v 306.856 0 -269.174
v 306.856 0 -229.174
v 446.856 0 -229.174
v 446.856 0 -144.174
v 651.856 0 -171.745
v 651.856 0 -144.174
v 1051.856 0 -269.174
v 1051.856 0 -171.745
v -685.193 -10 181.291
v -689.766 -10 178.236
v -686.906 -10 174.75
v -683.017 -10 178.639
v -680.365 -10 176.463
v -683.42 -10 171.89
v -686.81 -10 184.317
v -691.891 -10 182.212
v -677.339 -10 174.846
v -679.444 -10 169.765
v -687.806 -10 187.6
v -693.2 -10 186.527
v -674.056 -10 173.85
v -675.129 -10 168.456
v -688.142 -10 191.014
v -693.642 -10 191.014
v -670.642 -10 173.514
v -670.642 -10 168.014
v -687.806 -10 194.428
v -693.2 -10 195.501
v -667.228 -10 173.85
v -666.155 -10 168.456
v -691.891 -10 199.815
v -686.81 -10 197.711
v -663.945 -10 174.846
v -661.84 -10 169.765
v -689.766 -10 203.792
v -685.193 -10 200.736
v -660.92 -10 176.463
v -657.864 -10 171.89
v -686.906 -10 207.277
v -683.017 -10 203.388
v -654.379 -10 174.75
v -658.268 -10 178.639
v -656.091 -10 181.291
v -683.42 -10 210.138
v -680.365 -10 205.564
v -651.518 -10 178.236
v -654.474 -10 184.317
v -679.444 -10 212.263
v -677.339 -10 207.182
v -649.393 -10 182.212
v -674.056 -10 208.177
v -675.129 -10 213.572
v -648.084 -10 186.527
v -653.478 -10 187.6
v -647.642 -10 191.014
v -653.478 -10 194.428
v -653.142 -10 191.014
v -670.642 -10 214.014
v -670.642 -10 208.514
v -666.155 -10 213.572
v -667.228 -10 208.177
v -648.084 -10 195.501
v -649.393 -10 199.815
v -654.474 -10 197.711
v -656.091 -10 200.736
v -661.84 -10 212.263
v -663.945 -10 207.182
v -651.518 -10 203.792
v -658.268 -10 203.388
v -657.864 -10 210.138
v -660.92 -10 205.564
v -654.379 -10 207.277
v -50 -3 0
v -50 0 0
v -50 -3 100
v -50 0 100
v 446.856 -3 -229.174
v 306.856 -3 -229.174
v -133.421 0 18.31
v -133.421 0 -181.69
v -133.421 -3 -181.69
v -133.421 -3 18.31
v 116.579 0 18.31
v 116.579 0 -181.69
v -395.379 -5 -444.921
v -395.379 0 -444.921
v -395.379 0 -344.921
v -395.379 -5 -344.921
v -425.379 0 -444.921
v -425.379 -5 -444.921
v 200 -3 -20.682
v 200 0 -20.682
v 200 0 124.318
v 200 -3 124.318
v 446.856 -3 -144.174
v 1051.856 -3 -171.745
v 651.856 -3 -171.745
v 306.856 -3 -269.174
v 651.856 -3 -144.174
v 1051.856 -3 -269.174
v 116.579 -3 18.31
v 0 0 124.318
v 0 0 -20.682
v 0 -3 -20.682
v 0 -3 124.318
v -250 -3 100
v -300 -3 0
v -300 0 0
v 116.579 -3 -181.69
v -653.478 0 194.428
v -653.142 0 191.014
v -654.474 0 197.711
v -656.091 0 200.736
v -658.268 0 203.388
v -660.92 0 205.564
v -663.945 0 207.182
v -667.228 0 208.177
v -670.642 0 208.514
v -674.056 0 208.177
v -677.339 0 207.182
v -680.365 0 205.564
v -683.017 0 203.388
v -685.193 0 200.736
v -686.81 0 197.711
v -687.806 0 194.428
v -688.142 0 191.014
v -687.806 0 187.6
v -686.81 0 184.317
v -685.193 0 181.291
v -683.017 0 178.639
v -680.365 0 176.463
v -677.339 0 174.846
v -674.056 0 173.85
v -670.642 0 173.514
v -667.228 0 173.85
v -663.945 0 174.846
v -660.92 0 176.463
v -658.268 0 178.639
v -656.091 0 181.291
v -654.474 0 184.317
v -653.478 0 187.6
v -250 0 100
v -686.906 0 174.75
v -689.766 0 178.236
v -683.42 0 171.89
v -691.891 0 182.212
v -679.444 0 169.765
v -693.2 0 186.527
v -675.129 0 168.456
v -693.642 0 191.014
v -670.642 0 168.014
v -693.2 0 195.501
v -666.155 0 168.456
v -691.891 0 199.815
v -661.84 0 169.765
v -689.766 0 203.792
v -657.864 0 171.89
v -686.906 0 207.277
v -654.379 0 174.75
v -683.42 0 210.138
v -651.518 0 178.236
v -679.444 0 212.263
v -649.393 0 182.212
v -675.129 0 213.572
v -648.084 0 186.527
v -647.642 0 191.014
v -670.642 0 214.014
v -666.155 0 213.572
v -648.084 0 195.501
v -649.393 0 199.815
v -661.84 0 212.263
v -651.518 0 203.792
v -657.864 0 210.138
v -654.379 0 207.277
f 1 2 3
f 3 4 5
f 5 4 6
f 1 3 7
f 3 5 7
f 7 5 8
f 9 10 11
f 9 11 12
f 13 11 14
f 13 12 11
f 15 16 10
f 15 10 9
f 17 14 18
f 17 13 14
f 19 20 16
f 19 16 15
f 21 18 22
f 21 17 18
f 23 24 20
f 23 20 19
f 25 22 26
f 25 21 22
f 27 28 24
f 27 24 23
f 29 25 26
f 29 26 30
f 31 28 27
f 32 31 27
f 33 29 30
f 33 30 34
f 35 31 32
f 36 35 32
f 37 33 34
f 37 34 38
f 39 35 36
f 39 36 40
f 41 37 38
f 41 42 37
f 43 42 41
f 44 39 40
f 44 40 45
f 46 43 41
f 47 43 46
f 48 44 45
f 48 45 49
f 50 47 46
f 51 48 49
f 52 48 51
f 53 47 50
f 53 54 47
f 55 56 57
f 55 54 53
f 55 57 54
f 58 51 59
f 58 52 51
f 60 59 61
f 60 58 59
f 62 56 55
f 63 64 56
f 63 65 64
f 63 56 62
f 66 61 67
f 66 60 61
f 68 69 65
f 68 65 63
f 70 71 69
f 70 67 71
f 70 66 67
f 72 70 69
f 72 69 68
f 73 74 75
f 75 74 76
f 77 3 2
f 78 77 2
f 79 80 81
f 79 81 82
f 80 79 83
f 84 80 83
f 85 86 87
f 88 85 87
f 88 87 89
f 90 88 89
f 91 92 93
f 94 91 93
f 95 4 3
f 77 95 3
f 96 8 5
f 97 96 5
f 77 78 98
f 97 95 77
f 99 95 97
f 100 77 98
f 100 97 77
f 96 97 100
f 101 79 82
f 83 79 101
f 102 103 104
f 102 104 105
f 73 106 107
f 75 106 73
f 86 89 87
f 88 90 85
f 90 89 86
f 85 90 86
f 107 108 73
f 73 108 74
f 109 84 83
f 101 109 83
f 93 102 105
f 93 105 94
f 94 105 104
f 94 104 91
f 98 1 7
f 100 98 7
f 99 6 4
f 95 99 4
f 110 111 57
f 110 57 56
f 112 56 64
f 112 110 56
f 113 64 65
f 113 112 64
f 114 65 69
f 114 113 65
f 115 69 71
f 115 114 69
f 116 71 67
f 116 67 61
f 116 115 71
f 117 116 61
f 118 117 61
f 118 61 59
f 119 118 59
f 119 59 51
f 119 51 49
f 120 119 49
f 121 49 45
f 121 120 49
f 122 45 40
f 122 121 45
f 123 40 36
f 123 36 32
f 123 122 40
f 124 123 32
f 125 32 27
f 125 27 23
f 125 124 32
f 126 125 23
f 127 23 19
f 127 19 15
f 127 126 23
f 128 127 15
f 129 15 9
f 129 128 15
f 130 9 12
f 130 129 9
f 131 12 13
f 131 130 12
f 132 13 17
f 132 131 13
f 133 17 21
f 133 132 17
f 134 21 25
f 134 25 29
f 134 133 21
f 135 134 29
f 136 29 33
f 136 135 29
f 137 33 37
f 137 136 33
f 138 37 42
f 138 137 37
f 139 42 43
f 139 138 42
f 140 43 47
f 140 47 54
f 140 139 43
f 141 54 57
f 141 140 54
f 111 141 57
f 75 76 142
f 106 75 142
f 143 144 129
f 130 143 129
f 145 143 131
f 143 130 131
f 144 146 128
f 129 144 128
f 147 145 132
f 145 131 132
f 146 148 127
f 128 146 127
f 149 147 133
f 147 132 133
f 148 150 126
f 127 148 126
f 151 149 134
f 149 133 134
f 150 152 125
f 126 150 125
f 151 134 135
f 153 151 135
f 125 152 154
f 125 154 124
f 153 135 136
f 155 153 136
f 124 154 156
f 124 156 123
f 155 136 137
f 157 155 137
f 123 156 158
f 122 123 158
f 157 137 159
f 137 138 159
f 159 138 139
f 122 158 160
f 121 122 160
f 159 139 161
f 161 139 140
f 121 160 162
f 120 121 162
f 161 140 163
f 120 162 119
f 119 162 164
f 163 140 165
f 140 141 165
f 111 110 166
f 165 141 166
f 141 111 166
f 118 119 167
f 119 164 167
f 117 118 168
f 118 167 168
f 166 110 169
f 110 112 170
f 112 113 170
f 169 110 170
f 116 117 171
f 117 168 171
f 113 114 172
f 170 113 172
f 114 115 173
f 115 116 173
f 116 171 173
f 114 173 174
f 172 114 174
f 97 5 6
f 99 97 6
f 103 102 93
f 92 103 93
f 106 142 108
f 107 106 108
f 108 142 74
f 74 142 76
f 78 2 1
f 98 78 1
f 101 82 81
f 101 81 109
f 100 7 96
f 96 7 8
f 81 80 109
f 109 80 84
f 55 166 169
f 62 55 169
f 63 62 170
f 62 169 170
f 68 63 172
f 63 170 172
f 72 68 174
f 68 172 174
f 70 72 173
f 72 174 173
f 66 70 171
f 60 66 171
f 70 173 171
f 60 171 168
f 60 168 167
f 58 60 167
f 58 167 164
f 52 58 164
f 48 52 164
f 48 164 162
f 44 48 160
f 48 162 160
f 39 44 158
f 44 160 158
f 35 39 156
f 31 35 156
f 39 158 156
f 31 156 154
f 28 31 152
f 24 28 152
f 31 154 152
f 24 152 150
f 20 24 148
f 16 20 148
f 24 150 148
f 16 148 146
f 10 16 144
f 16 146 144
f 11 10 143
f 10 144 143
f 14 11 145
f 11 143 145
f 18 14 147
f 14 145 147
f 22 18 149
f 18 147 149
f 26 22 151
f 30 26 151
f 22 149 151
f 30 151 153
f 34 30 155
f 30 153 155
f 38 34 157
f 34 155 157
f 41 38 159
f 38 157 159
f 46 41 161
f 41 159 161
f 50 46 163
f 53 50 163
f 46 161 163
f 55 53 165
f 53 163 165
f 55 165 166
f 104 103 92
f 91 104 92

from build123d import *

# Parameters (mm, degrees)
F0_W      = 200
F0_H      = 145
F1_DEPTH  = 3
F3_DEPTH  = 3
F4_W      = 250
F4_H      = 200
F5_DEPTH  = 3
F7_DEPTH  = 3
F9_DEPTH  = 5
F10_R     = 23
F10_R_2   = 17.5
F11_DEPTH = 10


with BuildPart() as f1:
    # F0 (on Front) → F1 (new body)
    with BuildSketch(Plane.XZ):
        with Locations((100, 51.818181)):
            Rectangle(F0_W, F0_H)
    extrude(amount=F1_DEPTH)


with BuildPart() as f3:
    # F2 (on Front) → F3 (new body)
    with BuildSketch(Plane.XZ):
        Polygon((-300, 0), (-50, 0), (-50, 100), (-250, 100), align=None)
    extrude(amount=F3_DEPTH)


with BuildPart() as f5:
    # F4 (on Front) → F5 (new body)
    with BuildSketch(Plane.XZ):
        with Locations((-8.421481, -81.690291)):
            Rectangle(F4_W, F4_H)
    extrude(amount=F5_DEPTH)


with BuildPart() as f7:
    # F6 (on Front) → F7 (new body)
    with BuildSketch(Plane.XZ):
        Polygon((651.855922, -144.173652), (446.855922, -144.173652), (446.855922, -229.173652), (306.855922, -229.173652), (306.855922, -269.173652), (1051.855922, -269.173652), (1051.855922, -171.745211), (651.855922, -171.745211), align=None)
    extrude(amount=F7_DEPTH)


with BuildPart() as f9:
    # F8 (on Front) → F9 (new body)
    with BuildSketch(Plane.XZ):
        Polygon((-395.379289, -344.920856), (-425.379289, -444.920856), (-395.379289, -444.920856), align=None)
    extrude(amount=F9_DEPTH)


with BuildPart() as f11:
    # F10 (on Front) → F11 (new body)
    with BuildSketch(Plane.XZ):
        with Locations((-670.642197, 191.013753)):
            Circle(F10_R)
        with Locations((-670.642197, 191.013753)):
            Circle(F10_R_2, mode=Mode.SUBTRACT)
    extrude(amount=F11_DEPTH)


solid = Compound([f1.part, f3.part, f5.part, f7.part, f9.part, f11.part])
